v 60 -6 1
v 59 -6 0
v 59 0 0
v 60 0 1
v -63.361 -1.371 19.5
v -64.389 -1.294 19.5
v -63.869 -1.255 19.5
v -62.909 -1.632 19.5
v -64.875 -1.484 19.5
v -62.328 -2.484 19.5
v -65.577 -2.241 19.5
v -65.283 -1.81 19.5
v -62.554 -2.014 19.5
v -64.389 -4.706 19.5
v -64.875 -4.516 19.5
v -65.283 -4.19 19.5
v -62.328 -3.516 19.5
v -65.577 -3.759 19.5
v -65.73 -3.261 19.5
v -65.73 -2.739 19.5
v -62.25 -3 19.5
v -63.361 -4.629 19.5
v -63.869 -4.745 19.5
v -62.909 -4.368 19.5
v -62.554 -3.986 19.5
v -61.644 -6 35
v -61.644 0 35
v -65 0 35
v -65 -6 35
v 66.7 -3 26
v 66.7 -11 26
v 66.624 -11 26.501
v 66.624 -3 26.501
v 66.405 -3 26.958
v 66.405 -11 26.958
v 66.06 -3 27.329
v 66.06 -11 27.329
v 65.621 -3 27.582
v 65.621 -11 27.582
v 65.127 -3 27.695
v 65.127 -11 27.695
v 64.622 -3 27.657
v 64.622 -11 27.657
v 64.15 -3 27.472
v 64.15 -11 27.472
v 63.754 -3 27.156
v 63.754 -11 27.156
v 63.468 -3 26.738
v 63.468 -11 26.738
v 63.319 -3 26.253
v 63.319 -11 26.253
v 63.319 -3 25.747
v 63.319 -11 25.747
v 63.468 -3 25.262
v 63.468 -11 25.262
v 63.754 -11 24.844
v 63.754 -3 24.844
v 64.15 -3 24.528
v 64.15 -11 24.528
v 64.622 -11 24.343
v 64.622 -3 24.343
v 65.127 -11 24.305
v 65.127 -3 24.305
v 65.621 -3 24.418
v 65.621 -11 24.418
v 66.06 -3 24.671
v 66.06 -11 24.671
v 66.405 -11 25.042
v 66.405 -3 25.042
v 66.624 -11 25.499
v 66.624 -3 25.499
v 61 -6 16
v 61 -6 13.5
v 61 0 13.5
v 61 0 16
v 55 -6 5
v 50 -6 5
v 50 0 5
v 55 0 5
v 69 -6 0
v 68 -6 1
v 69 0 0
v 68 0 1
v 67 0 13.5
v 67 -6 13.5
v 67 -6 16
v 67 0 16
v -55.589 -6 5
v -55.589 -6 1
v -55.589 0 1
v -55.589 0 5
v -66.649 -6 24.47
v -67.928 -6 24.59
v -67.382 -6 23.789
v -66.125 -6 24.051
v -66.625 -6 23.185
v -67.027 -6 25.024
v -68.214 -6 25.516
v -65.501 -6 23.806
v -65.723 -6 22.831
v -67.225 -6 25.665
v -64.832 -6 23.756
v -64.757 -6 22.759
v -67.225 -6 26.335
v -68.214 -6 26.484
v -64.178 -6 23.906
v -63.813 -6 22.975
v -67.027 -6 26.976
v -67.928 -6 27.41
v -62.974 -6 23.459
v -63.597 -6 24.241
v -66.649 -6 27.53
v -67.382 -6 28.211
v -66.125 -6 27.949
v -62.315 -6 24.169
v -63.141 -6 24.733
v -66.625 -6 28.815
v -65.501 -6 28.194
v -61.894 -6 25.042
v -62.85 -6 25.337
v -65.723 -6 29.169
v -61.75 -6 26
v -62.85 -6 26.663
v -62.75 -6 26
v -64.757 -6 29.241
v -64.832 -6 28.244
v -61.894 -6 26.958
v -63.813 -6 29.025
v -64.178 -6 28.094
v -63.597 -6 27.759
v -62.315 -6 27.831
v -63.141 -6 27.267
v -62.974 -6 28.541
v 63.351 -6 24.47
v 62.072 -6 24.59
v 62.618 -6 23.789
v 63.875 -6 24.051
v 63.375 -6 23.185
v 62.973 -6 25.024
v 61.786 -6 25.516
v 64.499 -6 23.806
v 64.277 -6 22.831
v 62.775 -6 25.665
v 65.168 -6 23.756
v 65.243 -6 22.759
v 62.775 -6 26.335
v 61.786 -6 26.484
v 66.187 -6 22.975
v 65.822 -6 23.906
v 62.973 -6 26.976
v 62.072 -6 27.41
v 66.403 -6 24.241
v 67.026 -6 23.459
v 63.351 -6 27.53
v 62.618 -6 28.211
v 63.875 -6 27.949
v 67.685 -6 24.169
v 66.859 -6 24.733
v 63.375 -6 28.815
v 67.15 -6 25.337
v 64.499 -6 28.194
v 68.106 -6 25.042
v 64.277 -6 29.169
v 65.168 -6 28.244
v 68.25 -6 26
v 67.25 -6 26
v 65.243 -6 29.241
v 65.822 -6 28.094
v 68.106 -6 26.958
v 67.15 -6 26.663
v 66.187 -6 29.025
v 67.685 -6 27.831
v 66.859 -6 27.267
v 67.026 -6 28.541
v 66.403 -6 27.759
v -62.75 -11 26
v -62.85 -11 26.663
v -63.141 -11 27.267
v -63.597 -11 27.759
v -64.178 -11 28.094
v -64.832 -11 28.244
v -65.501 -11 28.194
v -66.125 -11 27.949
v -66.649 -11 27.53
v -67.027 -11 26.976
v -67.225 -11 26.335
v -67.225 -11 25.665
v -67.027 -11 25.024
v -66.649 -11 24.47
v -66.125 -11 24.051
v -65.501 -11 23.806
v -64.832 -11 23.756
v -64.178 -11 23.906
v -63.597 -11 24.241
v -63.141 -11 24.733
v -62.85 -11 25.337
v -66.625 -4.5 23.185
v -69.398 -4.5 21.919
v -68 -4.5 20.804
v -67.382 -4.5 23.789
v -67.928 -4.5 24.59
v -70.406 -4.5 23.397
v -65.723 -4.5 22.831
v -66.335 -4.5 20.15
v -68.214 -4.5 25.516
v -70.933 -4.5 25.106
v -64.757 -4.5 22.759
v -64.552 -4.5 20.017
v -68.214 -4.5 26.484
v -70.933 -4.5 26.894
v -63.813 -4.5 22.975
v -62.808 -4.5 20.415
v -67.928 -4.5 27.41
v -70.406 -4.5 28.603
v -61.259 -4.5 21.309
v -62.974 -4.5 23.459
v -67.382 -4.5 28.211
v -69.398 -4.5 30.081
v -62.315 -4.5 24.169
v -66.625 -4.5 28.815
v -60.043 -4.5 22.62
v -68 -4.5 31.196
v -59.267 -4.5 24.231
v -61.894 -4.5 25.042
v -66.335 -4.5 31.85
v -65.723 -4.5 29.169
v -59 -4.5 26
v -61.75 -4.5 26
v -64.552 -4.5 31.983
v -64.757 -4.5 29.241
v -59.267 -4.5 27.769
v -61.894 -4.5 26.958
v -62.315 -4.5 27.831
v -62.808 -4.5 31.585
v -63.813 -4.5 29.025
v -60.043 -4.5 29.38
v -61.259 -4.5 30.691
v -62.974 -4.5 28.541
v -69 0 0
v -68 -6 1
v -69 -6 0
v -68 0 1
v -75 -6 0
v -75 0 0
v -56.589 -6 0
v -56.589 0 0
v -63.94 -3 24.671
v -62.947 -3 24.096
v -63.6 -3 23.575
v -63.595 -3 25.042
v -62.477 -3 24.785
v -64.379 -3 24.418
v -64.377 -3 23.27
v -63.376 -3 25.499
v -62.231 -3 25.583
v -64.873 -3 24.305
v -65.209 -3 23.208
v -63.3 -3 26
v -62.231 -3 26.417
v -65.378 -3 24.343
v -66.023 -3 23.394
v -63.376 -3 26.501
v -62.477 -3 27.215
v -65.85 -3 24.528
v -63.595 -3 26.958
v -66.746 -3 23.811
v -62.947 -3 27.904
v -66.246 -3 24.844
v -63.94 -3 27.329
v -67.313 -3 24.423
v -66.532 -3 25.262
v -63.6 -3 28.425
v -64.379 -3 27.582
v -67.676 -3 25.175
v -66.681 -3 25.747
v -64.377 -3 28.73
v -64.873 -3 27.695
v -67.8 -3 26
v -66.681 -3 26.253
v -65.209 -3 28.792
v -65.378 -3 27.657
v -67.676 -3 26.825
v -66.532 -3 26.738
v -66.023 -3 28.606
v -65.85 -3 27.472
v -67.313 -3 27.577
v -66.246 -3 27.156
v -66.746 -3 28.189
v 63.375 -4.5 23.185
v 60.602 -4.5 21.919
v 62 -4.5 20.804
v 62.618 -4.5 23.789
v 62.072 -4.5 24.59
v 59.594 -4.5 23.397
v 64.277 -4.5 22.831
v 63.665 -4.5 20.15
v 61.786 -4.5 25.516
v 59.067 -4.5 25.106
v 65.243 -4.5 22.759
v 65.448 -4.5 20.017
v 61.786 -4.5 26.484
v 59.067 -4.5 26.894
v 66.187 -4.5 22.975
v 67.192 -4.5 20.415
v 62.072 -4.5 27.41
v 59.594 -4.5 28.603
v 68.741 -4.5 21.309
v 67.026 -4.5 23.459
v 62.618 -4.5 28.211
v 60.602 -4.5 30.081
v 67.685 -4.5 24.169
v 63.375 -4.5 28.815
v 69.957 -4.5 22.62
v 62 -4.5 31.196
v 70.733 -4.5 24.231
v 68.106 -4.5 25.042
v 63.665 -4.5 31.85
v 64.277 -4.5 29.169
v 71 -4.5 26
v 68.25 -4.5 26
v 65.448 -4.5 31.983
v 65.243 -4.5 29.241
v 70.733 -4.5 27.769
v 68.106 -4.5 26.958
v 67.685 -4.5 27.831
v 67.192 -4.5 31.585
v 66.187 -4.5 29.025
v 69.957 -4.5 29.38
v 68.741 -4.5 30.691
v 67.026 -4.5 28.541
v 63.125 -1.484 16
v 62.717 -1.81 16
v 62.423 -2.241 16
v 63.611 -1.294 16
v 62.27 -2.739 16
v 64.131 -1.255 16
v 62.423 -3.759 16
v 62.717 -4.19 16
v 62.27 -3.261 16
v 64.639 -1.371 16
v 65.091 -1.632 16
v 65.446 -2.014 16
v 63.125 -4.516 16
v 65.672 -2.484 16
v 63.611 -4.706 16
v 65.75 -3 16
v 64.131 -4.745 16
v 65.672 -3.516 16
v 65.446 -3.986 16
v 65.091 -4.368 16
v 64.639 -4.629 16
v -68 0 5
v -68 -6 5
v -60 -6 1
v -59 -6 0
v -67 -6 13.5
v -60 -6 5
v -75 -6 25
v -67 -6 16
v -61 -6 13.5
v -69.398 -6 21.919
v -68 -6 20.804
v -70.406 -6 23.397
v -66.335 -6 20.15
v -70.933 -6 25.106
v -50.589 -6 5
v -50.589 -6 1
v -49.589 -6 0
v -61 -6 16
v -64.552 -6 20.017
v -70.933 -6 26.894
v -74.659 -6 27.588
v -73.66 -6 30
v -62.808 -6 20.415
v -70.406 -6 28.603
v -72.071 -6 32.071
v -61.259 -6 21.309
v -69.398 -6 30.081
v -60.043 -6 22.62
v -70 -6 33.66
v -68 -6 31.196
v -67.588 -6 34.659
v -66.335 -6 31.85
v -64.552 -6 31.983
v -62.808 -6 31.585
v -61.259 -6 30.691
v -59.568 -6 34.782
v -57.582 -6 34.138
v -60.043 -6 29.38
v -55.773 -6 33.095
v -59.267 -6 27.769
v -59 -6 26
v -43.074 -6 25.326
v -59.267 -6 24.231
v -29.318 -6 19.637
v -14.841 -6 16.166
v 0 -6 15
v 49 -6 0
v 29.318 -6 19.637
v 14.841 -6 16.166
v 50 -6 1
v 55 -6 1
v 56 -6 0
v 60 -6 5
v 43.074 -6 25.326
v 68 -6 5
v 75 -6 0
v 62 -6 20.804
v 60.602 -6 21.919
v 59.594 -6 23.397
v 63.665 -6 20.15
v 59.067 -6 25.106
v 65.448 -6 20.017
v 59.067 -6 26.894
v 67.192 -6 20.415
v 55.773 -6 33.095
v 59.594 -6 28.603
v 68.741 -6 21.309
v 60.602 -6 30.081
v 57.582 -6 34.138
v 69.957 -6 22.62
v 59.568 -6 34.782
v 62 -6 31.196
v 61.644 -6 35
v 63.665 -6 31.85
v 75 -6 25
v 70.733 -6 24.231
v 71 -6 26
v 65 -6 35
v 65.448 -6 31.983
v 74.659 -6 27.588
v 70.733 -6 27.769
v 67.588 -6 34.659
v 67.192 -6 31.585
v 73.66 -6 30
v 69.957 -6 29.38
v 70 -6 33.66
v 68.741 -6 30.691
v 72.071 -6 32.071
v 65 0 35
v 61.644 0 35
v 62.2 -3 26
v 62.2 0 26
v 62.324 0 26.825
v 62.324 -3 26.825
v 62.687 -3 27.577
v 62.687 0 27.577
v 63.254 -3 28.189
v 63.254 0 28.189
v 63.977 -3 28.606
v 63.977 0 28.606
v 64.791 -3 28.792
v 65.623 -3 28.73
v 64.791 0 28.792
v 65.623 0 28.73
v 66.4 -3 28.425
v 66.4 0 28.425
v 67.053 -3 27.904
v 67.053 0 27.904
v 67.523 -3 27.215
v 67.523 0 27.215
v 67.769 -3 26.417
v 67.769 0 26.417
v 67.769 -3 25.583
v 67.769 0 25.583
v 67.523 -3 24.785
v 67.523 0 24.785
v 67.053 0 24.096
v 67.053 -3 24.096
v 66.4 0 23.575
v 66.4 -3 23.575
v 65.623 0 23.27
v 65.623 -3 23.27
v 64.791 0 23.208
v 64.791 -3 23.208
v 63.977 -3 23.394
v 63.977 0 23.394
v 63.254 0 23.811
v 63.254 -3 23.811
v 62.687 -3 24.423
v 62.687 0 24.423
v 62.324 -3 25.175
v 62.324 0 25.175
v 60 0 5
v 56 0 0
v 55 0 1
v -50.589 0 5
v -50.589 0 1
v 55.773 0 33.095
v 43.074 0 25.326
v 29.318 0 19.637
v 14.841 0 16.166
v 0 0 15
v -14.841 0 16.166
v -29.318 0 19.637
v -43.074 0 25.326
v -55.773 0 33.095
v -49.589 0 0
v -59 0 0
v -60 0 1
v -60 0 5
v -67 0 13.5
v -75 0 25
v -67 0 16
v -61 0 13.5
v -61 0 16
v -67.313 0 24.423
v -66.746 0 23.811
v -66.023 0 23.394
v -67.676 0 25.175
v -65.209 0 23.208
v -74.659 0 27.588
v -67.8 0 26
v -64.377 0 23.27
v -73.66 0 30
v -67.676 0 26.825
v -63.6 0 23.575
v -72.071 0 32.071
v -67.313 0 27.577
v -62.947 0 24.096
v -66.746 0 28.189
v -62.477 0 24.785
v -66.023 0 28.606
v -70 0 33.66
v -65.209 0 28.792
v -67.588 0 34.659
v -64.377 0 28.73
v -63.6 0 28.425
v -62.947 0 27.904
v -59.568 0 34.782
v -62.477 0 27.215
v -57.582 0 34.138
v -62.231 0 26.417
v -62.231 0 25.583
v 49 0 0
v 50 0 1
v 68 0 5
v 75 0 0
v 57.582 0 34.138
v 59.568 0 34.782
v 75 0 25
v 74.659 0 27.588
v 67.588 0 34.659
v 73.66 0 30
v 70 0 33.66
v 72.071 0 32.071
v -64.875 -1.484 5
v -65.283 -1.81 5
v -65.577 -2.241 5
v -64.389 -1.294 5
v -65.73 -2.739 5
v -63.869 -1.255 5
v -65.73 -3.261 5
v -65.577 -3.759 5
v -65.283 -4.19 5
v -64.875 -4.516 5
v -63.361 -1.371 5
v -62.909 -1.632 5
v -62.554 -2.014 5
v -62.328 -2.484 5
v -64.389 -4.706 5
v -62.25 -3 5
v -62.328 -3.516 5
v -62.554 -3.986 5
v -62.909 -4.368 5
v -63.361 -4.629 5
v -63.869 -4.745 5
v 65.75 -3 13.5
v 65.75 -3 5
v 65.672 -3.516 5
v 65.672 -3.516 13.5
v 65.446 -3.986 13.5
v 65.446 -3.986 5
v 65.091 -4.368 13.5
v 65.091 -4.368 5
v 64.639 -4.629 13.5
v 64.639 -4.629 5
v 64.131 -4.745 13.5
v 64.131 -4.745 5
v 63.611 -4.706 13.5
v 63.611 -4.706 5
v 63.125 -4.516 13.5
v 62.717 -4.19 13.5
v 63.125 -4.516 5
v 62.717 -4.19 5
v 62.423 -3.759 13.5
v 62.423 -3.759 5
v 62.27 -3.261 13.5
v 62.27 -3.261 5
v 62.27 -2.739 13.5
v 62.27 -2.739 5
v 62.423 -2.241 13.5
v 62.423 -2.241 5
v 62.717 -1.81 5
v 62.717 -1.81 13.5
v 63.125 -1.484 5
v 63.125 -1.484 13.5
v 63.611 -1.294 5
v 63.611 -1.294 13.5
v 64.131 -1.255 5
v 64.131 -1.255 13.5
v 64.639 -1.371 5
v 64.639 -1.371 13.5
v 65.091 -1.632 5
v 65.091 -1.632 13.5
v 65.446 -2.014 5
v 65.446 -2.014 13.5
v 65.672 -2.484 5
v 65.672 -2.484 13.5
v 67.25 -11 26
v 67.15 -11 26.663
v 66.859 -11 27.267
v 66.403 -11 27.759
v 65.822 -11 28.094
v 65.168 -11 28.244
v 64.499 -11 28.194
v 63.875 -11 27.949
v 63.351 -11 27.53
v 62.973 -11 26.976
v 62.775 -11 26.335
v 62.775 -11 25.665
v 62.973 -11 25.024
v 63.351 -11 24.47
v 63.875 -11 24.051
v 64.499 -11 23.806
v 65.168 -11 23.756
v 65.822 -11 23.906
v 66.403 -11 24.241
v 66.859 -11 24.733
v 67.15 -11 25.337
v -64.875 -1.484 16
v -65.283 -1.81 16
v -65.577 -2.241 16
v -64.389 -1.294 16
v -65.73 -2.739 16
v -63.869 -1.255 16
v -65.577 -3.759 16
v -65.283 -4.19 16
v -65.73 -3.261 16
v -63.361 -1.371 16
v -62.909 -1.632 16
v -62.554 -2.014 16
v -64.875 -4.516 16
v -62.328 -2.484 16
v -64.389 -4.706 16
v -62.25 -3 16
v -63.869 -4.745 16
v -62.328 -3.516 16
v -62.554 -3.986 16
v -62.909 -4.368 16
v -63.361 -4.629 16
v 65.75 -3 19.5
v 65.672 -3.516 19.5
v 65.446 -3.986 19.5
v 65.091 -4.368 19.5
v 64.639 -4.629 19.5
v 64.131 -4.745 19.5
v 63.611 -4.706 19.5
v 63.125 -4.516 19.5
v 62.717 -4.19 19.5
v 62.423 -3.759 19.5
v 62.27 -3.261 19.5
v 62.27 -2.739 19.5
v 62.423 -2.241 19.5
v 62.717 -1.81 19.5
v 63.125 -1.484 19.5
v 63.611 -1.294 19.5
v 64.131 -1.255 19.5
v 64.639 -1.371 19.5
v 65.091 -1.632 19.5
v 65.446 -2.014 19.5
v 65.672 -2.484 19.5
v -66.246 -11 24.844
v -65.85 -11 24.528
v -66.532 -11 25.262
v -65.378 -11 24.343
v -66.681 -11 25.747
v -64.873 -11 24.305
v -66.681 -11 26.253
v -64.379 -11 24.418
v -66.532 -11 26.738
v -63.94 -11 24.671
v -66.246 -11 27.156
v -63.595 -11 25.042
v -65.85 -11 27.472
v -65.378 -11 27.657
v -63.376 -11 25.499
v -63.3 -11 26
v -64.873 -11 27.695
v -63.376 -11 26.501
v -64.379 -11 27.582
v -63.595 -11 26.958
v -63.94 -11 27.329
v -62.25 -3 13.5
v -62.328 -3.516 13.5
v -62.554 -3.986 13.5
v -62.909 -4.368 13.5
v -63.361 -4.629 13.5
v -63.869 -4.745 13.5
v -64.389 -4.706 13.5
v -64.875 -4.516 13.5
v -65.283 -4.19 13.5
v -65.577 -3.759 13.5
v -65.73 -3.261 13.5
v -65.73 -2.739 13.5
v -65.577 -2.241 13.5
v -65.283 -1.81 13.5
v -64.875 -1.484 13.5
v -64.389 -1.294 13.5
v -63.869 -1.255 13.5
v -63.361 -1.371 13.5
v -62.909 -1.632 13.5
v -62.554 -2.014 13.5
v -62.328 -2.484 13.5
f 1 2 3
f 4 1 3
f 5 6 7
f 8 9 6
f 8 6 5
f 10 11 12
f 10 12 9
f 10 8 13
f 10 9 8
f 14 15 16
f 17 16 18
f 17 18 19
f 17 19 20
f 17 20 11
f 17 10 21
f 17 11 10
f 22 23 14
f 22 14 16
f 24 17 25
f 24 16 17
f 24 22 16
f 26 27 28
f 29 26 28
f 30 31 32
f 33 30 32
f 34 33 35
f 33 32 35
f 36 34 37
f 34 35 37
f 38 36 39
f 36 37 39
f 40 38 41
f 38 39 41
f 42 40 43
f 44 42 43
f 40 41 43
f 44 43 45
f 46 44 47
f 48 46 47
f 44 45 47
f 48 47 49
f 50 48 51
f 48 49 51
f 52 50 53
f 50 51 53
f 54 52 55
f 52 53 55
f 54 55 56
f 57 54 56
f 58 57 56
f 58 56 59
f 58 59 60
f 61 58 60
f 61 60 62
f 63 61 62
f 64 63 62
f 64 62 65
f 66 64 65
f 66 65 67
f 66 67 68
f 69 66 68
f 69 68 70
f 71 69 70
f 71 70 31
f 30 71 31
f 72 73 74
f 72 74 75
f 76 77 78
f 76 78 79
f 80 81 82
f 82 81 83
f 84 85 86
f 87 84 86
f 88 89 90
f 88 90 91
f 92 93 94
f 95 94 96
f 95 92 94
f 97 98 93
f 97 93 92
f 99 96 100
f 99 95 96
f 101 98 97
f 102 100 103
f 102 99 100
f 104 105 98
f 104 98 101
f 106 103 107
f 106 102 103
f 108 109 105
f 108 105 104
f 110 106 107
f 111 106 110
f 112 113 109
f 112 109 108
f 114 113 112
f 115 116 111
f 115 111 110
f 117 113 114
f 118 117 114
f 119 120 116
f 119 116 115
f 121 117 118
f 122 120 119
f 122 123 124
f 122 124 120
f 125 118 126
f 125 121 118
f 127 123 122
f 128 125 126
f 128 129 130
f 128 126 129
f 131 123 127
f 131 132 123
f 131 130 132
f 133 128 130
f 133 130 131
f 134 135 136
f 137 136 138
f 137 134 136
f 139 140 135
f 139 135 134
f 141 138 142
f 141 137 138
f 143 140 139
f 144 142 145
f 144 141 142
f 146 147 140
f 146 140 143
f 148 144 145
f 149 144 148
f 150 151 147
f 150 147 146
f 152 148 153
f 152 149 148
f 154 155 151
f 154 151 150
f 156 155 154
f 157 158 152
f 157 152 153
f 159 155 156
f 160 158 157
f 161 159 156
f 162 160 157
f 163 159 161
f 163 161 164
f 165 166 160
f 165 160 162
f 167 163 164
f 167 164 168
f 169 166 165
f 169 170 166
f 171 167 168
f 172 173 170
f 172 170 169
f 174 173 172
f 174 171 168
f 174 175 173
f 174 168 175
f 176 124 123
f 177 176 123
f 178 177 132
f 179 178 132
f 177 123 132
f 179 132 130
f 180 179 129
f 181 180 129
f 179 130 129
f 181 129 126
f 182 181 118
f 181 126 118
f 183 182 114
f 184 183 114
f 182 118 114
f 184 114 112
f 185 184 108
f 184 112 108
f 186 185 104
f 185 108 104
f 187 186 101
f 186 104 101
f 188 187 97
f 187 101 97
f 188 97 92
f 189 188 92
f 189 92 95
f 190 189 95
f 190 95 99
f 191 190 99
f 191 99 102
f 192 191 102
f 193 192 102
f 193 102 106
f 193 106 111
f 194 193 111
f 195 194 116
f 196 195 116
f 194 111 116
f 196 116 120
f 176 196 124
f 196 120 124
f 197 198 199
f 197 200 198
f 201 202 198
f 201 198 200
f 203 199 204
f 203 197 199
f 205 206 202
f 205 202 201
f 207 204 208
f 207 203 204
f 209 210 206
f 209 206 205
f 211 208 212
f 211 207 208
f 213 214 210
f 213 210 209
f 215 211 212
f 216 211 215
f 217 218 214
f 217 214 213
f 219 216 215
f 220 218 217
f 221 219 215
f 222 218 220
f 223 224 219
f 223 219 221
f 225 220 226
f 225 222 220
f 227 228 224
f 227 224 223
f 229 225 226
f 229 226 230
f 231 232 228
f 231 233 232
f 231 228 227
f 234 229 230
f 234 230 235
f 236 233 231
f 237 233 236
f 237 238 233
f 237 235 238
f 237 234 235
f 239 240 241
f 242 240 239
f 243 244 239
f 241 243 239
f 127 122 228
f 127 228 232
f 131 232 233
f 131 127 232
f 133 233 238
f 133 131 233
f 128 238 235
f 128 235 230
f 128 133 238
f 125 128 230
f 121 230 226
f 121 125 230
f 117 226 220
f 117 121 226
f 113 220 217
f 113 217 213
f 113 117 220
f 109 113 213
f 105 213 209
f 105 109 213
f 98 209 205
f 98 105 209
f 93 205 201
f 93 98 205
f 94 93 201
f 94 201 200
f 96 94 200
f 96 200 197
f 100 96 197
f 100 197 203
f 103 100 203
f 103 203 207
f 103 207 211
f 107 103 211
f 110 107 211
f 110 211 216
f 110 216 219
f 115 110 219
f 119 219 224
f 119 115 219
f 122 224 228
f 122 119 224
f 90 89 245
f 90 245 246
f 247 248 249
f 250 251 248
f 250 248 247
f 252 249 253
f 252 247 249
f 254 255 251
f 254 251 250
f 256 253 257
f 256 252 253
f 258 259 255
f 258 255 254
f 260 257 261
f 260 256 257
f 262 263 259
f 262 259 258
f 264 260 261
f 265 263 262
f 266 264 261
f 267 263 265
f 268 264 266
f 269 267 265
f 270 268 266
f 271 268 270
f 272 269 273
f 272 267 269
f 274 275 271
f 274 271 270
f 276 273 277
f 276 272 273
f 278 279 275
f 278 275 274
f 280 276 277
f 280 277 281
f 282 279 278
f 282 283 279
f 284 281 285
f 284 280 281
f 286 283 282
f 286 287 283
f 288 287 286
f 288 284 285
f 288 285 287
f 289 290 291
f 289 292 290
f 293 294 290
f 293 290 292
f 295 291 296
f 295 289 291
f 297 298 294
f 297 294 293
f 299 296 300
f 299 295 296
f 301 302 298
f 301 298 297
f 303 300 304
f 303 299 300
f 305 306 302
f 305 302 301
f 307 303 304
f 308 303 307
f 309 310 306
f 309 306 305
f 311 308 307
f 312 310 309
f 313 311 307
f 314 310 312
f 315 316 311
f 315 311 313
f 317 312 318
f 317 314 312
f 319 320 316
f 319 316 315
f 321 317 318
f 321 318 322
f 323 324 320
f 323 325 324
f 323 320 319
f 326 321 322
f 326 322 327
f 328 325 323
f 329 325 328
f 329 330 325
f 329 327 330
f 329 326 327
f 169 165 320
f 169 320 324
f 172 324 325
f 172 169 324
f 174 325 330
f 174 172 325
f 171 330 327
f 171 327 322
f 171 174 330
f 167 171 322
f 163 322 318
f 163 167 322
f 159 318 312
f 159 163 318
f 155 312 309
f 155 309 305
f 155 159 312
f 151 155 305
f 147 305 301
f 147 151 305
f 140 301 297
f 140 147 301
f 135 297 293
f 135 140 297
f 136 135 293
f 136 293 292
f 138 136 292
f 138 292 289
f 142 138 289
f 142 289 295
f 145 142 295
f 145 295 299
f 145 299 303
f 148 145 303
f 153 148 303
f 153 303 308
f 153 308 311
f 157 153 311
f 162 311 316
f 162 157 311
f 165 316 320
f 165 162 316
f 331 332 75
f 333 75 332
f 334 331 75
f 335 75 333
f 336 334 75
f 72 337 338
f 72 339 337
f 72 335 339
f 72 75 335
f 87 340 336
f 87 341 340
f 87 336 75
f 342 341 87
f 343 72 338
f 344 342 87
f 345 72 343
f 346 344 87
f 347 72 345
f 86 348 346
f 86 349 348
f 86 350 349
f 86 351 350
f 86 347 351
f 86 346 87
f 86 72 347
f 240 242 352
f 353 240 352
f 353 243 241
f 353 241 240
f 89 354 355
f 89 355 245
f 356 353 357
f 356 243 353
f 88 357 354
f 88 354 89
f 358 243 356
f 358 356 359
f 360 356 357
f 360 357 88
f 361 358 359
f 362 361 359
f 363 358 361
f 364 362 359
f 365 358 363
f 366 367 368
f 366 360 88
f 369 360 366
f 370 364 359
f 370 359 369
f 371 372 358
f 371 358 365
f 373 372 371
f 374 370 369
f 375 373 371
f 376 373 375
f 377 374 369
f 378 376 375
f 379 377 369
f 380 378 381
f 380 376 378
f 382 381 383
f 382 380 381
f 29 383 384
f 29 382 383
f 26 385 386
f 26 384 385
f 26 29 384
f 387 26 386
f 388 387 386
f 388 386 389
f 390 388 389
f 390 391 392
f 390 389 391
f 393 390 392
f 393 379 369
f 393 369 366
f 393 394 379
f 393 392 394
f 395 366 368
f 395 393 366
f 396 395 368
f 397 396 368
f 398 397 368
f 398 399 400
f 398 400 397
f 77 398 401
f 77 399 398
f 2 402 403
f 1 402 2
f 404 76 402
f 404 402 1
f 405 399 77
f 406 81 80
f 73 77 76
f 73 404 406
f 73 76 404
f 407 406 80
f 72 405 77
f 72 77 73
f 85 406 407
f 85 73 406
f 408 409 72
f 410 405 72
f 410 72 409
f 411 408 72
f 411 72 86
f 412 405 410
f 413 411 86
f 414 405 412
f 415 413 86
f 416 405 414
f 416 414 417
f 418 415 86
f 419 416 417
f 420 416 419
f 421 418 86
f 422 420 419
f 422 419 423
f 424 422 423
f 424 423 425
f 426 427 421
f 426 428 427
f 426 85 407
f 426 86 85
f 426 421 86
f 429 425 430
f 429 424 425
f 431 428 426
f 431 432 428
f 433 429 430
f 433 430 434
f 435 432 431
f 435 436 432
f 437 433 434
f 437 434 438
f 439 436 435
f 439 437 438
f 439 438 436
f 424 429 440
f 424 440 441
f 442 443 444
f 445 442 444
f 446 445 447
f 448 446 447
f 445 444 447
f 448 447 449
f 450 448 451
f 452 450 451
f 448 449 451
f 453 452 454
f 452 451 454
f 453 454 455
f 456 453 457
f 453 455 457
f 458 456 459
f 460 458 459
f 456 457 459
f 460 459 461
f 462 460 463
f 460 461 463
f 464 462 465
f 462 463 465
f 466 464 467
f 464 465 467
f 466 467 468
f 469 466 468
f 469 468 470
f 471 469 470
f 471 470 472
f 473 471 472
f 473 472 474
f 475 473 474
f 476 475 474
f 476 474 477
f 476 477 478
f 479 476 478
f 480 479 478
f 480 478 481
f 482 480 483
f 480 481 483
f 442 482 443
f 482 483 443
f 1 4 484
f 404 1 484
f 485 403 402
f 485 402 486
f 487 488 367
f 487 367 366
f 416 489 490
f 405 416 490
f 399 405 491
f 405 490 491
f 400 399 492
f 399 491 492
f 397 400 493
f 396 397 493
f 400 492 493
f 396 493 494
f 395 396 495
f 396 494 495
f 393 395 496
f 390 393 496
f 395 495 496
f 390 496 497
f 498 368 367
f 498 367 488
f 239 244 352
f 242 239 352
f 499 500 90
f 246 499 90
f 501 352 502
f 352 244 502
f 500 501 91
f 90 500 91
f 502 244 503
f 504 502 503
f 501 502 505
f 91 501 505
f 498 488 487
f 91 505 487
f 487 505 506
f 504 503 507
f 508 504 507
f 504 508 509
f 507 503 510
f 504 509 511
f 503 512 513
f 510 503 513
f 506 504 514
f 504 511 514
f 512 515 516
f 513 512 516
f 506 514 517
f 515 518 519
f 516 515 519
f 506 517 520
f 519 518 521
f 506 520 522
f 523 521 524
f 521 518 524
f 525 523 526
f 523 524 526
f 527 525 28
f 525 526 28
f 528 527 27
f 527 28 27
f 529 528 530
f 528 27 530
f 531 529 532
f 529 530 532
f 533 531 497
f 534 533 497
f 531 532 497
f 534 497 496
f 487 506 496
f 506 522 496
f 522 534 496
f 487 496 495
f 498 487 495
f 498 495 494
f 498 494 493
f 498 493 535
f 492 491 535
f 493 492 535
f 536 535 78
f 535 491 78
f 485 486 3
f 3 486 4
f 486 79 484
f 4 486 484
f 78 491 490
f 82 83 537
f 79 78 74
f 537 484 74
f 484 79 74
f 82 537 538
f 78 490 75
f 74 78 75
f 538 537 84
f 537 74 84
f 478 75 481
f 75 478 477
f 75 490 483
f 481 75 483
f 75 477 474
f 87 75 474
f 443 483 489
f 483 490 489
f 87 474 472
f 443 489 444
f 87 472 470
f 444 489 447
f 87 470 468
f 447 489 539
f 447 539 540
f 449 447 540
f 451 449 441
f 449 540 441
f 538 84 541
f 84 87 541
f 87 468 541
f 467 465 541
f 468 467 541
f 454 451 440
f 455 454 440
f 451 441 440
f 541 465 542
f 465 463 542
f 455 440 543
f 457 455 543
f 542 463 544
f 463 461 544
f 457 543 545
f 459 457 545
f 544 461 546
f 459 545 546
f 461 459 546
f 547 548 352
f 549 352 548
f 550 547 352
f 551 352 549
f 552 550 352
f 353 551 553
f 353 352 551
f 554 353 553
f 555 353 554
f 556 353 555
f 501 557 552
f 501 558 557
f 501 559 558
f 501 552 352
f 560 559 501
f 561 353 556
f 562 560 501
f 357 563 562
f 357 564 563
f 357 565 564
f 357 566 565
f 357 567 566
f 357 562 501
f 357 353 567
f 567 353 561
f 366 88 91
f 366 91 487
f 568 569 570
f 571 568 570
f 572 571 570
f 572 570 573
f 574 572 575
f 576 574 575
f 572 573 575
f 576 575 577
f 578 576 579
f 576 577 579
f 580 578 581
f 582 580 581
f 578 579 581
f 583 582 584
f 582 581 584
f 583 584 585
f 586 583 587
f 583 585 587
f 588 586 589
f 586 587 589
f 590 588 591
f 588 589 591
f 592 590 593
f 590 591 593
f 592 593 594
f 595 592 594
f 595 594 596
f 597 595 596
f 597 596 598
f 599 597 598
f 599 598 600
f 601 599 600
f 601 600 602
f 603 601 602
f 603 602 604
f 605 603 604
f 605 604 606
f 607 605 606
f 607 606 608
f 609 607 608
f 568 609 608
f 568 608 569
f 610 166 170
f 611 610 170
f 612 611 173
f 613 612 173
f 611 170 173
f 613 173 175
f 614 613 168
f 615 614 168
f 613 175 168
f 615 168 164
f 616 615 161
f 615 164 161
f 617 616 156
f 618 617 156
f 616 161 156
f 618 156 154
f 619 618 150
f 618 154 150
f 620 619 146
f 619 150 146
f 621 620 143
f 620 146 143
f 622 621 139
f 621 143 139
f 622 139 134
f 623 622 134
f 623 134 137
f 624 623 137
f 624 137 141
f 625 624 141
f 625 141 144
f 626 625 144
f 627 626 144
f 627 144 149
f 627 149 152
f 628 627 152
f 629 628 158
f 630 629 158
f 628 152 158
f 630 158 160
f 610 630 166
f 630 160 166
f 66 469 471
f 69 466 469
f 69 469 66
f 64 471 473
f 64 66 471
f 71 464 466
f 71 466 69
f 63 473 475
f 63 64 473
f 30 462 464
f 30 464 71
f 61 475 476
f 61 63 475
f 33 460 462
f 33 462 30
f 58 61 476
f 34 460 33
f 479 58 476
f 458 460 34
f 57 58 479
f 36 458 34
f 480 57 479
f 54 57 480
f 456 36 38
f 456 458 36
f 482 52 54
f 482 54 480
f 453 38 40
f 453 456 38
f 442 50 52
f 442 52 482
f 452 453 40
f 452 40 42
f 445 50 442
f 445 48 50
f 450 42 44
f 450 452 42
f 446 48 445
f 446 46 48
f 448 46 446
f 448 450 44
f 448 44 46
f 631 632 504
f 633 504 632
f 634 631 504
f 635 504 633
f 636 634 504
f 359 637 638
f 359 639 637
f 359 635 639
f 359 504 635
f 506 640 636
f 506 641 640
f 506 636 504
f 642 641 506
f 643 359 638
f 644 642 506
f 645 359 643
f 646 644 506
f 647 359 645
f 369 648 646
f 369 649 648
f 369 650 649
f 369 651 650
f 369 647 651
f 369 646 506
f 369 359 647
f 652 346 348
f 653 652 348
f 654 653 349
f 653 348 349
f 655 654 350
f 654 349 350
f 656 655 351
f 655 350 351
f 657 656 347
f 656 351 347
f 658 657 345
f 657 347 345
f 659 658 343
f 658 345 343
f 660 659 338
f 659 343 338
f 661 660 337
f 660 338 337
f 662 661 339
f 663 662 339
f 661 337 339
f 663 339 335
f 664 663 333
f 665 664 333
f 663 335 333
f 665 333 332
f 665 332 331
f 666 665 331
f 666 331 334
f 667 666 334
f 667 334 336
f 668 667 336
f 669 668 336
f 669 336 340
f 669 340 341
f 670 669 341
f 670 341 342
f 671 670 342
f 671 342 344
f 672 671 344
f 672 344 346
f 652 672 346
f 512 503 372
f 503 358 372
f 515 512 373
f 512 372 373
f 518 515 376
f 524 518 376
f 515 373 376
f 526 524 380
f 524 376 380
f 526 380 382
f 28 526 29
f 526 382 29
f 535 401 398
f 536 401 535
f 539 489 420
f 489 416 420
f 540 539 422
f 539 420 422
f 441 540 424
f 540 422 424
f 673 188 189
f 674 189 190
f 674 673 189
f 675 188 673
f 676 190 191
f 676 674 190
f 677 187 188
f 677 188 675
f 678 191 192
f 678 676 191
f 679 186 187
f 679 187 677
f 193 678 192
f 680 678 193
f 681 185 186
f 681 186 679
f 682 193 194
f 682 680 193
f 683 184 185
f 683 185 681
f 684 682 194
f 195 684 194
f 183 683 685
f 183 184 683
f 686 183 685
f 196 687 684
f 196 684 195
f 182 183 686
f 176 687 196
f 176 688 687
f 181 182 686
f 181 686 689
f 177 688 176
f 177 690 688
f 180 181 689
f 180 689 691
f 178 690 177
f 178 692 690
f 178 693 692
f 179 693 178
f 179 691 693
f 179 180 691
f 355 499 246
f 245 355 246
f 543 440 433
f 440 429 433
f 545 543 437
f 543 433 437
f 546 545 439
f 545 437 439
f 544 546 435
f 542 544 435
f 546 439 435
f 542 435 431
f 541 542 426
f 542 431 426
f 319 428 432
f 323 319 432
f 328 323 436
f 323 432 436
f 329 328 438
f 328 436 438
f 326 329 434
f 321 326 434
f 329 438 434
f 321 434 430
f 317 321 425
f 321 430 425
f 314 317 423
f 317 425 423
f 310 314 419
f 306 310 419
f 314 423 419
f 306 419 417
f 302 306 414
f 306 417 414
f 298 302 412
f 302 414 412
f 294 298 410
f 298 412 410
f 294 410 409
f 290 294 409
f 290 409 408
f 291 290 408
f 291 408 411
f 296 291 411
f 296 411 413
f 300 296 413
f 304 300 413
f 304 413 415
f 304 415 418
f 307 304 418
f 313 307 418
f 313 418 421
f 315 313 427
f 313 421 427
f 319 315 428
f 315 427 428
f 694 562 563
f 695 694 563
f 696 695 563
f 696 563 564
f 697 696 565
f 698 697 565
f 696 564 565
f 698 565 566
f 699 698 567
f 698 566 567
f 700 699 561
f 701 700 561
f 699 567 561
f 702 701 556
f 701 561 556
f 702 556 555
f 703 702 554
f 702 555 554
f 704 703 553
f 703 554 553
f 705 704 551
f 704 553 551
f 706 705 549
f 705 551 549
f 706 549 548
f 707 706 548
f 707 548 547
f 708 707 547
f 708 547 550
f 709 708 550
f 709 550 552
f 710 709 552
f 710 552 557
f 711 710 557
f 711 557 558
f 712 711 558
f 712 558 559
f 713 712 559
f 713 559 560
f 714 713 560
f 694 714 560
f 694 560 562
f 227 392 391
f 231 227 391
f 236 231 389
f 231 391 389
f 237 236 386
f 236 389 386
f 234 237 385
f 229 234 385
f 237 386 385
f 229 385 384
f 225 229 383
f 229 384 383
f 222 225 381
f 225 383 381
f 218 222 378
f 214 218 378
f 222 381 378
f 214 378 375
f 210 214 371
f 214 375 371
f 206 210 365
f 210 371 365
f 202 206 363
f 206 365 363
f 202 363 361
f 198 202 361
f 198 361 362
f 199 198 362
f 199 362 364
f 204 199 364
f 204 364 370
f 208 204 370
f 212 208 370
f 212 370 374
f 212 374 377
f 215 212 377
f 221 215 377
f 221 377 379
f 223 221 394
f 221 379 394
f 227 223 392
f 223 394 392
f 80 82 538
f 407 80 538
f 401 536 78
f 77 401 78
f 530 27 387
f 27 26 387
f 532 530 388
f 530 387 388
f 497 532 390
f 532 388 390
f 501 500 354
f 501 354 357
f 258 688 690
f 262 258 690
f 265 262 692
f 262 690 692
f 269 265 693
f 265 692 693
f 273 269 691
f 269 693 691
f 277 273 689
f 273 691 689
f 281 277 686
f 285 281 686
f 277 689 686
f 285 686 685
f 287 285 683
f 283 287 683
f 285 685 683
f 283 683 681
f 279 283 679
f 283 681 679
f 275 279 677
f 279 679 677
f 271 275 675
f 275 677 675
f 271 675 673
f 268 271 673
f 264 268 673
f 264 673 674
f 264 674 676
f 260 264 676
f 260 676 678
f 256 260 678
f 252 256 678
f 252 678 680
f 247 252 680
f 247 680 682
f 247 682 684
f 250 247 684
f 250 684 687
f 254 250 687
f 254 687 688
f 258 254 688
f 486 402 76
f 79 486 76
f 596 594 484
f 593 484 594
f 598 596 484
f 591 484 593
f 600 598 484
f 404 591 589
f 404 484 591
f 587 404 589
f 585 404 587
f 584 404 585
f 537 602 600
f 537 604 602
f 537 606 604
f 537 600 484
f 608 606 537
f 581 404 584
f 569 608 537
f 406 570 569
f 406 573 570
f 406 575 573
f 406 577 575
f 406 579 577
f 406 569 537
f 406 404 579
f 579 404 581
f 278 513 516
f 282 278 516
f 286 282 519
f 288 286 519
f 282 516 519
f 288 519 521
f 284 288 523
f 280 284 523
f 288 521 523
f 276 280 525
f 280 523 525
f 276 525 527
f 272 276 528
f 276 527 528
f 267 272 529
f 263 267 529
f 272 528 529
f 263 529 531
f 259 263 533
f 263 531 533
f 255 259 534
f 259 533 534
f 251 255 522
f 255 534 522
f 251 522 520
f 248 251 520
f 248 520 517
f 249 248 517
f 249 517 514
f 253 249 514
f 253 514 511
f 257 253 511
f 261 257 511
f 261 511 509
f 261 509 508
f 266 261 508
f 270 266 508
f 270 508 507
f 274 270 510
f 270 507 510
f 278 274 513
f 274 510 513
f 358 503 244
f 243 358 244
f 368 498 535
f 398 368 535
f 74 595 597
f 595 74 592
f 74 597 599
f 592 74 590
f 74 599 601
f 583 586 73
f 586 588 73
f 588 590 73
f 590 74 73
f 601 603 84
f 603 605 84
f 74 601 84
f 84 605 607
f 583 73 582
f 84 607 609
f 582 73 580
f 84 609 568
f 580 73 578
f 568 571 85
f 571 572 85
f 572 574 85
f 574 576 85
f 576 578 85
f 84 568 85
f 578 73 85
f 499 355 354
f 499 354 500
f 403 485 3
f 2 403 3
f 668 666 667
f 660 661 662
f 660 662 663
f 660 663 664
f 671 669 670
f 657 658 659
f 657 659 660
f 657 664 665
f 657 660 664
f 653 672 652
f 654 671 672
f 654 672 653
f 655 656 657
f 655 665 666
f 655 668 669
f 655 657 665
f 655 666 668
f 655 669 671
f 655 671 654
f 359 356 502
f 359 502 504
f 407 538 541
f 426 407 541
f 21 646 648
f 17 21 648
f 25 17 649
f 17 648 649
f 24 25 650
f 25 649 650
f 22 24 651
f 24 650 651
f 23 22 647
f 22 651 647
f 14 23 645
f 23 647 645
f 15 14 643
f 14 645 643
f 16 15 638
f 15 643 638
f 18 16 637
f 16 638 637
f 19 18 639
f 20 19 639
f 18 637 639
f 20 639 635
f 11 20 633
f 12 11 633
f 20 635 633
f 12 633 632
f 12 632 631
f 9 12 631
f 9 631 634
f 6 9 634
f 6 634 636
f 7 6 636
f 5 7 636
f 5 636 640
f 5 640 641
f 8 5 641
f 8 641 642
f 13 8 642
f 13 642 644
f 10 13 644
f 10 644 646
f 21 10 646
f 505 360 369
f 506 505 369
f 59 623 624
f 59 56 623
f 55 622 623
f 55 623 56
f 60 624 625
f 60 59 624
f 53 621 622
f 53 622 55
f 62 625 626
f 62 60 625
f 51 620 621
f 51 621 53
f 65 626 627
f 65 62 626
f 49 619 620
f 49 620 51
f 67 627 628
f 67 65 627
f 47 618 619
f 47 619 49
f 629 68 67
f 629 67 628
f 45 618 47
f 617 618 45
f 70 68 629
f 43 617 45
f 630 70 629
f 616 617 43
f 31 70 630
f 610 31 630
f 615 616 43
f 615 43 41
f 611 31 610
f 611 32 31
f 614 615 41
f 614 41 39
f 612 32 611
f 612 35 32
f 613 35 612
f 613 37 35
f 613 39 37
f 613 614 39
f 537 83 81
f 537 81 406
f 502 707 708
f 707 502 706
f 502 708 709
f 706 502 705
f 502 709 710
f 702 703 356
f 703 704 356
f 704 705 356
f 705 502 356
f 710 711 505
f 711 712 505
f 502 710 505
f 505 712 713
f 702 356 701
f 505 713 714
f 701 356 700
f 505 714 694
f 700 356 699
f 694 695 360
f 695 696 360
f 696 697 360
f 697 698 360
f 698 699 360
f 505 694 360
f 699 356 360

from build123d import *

# Parameters (mm, degrees)
F1_DEPTH  = 6
F2_R      = 6
F2_R_2    = 3.25
F3_DEPTH  = 1.5
F4_W      = 8
F4_H      = 5
F4_W_2    = 6
F4_H_2    = 2.5
F4_W_3    = 5
F5_DEPTH  = 6.001
F6_R      = 10
F7_SIZE   = 1
F8_R      = 1.75
F9_DEPTH  = 14.5
F10_R     = 1.75
F11_DEPTH = 14.5
F12_R     = 2.25
F13_DEPTH = 5
F14_R     = 1.7
F15_DEPTH = 11.001
F16_R     = 2.25
F17_DEPTH = 5
F18_R     = 1.7
F19_DEPTH = 11.001
F20_R     = 2.8
F20_R_2   = 1.7
F21_DEPTH = 3


with BuildPart() as f1:
    # F0 (on Front) → F1 (new body)
    with BuildSketch(Plane.XZ):
        with BuildLine():
            Line((-75, 0), (75, 0))
            Line((75, 0), (75, 35))
            Line((75, 35), (58.3095189485, 35))
            ThreePointArc((58.3095189485, 35), (0, 15), (-58.3095189485, 35))
            Line((-58.3095189485, 35), (-75, 35))
            Line((-75, 35), (-75, 0))
        make_face()
    extrude(amount=F1_DEPTH)

    # F2 (on face) → F3 (cut)
    with BuildSketch(Plane.XZ.offset(6)):
        with Locations((-65, 26)):
            Circle(F2_R)
        with Locations((-65, 26)):
            Circle(F2_R_2, mode=Mode.SUBTRACT)
        with Locations((65, 26)):
            Circle(F2_R)
        with Locations((65, 26)):
            Circle(F2_R_2, mode=Mode.SUBTRACT)
    extrude(amount=-F3_DEPTH, mode=Mode.SUBTRACT)

    # F4 (on face) → F5 (cut, through all)
    with BuildSketch(Plane.XZ.offset(6)):
        with Locations((-64, 2.5)):
            Rectangle(F4_W, F4_H)
        with Locations((64, 2.5)):
            Rectangle(F4_W, F4_H)
        with Locations((-64, 14.75)):
            Rectangle(F4_W_2, F4_H_2)
        with Locations((64, 14.75)):
            Rectangle(F4_W_2, F4_H_2)
        with Locations((52.5, 2.5)):
            Rectangle(F4_W_3, F4_H)
        with Locations((-53.0885396898, 2.5)):
            Rectangle(F4_W_3, F4_H)
    extrude(amount=-F5_DEPTH, mode=Mode.SUBTRACT)

    # F6
    f6_edges = [f1.edges().sort_by_distance(p)[0] for p in [
        (-75, -3, 35),
        (75, -3, 35),
        (58.309519, -3, 35),
        (-58.309519, -3, 35),
    ]]
    fillet(f6_edges, radius=F6_R)

    # F7
    f7_edges = [f1.edges().sort_by_distance(p)[0] for p in [
        (-68, -3, 0),
        (-60, -3, 0),
        (60, -3, 0),
        (68, -3, 0),
        (-55.58854, -3, 0),
        (-50.58854, -3, 0),
        (50, -3, 0),
        (55, -3, 0),
    ]]
    chamfer(f7_edges, length=F7_SIZE)

    # F8 (on face) → F9 (cut)
    with BuildSketch(Plane(origin=(0, 0, 5), x_dir=(1, 0, 0), z_dir=(0, 0, -1))):
        with Locations((-64, 3)):
            Circle(F8_R)
    extrude(amount=-F9_DEPTH, mode=Mode.SUBTRACT)

    # F10 (on face) → F11 (cut)
    with BuildSketch(Plane(origin=(0, 0, 5), x_dir=(1, 0, 0), z_dir=(0, 0, -1))):
        with Locations((64, 3)):
            Circle(F10_R)
    extrude(amount=-F11_DEPTH, mode=Mode.SUBTRACT)

    # F12 (on face) → F13 (join)
    with BuildSketch(Plane.XZ.offset(6)):
        with Locations((-65, 26)):
            Circle(F12_R)
    extrude(amount=F13_DEPTH)

    # F14 (on face) → F15 (cut, through all)
    with BuildSketch(Plane.XZ.offset(11)):
        with Locations((-65, 26)):
            Circle(F14_R)
    extrude(amount=-F15_DEPTH, mode=Mode.SUBTRACT)

    # F16 (on face) → F17 (join)
    with BuildSketch(Plane.XZ.offset(6)):
        with Locations((65, 26)):
            Circle(F16_R)
    extrude(amount=F17_DEPTH)

    # F18 (on face) → F19 (cut, through all)
    with BuildSketch(Plane.XZ.offset(11)):
        with Locations((65, 26)):
            Circle(F18_R)
    extrude(amount=-F19_DEPTH, mode=Mode.SUBTRACT)

    # F20 (on face) → F21 (cut)
    with BuildSketch(Plane(origin=(0, 0, 0), x_dir=(-1, 0, 0), z_dir=(0, 1, 0))):
        with Locations((-65, 26)):
            Circle(F20_R)
        with Locations((-65, 26)):
            Circle(F20_R_2, mode=Mode.SUBTRACT)
        with Locations((65, 26)):
            Circle(F20_R)
        with Locations((65, 26)):
            Circle(F20_R_2, mode=Mode.SUBTRACT)
    extrude(amount=-F21_DEPTH, mode=Mode.SUBTRACT)


solid = f1.part
